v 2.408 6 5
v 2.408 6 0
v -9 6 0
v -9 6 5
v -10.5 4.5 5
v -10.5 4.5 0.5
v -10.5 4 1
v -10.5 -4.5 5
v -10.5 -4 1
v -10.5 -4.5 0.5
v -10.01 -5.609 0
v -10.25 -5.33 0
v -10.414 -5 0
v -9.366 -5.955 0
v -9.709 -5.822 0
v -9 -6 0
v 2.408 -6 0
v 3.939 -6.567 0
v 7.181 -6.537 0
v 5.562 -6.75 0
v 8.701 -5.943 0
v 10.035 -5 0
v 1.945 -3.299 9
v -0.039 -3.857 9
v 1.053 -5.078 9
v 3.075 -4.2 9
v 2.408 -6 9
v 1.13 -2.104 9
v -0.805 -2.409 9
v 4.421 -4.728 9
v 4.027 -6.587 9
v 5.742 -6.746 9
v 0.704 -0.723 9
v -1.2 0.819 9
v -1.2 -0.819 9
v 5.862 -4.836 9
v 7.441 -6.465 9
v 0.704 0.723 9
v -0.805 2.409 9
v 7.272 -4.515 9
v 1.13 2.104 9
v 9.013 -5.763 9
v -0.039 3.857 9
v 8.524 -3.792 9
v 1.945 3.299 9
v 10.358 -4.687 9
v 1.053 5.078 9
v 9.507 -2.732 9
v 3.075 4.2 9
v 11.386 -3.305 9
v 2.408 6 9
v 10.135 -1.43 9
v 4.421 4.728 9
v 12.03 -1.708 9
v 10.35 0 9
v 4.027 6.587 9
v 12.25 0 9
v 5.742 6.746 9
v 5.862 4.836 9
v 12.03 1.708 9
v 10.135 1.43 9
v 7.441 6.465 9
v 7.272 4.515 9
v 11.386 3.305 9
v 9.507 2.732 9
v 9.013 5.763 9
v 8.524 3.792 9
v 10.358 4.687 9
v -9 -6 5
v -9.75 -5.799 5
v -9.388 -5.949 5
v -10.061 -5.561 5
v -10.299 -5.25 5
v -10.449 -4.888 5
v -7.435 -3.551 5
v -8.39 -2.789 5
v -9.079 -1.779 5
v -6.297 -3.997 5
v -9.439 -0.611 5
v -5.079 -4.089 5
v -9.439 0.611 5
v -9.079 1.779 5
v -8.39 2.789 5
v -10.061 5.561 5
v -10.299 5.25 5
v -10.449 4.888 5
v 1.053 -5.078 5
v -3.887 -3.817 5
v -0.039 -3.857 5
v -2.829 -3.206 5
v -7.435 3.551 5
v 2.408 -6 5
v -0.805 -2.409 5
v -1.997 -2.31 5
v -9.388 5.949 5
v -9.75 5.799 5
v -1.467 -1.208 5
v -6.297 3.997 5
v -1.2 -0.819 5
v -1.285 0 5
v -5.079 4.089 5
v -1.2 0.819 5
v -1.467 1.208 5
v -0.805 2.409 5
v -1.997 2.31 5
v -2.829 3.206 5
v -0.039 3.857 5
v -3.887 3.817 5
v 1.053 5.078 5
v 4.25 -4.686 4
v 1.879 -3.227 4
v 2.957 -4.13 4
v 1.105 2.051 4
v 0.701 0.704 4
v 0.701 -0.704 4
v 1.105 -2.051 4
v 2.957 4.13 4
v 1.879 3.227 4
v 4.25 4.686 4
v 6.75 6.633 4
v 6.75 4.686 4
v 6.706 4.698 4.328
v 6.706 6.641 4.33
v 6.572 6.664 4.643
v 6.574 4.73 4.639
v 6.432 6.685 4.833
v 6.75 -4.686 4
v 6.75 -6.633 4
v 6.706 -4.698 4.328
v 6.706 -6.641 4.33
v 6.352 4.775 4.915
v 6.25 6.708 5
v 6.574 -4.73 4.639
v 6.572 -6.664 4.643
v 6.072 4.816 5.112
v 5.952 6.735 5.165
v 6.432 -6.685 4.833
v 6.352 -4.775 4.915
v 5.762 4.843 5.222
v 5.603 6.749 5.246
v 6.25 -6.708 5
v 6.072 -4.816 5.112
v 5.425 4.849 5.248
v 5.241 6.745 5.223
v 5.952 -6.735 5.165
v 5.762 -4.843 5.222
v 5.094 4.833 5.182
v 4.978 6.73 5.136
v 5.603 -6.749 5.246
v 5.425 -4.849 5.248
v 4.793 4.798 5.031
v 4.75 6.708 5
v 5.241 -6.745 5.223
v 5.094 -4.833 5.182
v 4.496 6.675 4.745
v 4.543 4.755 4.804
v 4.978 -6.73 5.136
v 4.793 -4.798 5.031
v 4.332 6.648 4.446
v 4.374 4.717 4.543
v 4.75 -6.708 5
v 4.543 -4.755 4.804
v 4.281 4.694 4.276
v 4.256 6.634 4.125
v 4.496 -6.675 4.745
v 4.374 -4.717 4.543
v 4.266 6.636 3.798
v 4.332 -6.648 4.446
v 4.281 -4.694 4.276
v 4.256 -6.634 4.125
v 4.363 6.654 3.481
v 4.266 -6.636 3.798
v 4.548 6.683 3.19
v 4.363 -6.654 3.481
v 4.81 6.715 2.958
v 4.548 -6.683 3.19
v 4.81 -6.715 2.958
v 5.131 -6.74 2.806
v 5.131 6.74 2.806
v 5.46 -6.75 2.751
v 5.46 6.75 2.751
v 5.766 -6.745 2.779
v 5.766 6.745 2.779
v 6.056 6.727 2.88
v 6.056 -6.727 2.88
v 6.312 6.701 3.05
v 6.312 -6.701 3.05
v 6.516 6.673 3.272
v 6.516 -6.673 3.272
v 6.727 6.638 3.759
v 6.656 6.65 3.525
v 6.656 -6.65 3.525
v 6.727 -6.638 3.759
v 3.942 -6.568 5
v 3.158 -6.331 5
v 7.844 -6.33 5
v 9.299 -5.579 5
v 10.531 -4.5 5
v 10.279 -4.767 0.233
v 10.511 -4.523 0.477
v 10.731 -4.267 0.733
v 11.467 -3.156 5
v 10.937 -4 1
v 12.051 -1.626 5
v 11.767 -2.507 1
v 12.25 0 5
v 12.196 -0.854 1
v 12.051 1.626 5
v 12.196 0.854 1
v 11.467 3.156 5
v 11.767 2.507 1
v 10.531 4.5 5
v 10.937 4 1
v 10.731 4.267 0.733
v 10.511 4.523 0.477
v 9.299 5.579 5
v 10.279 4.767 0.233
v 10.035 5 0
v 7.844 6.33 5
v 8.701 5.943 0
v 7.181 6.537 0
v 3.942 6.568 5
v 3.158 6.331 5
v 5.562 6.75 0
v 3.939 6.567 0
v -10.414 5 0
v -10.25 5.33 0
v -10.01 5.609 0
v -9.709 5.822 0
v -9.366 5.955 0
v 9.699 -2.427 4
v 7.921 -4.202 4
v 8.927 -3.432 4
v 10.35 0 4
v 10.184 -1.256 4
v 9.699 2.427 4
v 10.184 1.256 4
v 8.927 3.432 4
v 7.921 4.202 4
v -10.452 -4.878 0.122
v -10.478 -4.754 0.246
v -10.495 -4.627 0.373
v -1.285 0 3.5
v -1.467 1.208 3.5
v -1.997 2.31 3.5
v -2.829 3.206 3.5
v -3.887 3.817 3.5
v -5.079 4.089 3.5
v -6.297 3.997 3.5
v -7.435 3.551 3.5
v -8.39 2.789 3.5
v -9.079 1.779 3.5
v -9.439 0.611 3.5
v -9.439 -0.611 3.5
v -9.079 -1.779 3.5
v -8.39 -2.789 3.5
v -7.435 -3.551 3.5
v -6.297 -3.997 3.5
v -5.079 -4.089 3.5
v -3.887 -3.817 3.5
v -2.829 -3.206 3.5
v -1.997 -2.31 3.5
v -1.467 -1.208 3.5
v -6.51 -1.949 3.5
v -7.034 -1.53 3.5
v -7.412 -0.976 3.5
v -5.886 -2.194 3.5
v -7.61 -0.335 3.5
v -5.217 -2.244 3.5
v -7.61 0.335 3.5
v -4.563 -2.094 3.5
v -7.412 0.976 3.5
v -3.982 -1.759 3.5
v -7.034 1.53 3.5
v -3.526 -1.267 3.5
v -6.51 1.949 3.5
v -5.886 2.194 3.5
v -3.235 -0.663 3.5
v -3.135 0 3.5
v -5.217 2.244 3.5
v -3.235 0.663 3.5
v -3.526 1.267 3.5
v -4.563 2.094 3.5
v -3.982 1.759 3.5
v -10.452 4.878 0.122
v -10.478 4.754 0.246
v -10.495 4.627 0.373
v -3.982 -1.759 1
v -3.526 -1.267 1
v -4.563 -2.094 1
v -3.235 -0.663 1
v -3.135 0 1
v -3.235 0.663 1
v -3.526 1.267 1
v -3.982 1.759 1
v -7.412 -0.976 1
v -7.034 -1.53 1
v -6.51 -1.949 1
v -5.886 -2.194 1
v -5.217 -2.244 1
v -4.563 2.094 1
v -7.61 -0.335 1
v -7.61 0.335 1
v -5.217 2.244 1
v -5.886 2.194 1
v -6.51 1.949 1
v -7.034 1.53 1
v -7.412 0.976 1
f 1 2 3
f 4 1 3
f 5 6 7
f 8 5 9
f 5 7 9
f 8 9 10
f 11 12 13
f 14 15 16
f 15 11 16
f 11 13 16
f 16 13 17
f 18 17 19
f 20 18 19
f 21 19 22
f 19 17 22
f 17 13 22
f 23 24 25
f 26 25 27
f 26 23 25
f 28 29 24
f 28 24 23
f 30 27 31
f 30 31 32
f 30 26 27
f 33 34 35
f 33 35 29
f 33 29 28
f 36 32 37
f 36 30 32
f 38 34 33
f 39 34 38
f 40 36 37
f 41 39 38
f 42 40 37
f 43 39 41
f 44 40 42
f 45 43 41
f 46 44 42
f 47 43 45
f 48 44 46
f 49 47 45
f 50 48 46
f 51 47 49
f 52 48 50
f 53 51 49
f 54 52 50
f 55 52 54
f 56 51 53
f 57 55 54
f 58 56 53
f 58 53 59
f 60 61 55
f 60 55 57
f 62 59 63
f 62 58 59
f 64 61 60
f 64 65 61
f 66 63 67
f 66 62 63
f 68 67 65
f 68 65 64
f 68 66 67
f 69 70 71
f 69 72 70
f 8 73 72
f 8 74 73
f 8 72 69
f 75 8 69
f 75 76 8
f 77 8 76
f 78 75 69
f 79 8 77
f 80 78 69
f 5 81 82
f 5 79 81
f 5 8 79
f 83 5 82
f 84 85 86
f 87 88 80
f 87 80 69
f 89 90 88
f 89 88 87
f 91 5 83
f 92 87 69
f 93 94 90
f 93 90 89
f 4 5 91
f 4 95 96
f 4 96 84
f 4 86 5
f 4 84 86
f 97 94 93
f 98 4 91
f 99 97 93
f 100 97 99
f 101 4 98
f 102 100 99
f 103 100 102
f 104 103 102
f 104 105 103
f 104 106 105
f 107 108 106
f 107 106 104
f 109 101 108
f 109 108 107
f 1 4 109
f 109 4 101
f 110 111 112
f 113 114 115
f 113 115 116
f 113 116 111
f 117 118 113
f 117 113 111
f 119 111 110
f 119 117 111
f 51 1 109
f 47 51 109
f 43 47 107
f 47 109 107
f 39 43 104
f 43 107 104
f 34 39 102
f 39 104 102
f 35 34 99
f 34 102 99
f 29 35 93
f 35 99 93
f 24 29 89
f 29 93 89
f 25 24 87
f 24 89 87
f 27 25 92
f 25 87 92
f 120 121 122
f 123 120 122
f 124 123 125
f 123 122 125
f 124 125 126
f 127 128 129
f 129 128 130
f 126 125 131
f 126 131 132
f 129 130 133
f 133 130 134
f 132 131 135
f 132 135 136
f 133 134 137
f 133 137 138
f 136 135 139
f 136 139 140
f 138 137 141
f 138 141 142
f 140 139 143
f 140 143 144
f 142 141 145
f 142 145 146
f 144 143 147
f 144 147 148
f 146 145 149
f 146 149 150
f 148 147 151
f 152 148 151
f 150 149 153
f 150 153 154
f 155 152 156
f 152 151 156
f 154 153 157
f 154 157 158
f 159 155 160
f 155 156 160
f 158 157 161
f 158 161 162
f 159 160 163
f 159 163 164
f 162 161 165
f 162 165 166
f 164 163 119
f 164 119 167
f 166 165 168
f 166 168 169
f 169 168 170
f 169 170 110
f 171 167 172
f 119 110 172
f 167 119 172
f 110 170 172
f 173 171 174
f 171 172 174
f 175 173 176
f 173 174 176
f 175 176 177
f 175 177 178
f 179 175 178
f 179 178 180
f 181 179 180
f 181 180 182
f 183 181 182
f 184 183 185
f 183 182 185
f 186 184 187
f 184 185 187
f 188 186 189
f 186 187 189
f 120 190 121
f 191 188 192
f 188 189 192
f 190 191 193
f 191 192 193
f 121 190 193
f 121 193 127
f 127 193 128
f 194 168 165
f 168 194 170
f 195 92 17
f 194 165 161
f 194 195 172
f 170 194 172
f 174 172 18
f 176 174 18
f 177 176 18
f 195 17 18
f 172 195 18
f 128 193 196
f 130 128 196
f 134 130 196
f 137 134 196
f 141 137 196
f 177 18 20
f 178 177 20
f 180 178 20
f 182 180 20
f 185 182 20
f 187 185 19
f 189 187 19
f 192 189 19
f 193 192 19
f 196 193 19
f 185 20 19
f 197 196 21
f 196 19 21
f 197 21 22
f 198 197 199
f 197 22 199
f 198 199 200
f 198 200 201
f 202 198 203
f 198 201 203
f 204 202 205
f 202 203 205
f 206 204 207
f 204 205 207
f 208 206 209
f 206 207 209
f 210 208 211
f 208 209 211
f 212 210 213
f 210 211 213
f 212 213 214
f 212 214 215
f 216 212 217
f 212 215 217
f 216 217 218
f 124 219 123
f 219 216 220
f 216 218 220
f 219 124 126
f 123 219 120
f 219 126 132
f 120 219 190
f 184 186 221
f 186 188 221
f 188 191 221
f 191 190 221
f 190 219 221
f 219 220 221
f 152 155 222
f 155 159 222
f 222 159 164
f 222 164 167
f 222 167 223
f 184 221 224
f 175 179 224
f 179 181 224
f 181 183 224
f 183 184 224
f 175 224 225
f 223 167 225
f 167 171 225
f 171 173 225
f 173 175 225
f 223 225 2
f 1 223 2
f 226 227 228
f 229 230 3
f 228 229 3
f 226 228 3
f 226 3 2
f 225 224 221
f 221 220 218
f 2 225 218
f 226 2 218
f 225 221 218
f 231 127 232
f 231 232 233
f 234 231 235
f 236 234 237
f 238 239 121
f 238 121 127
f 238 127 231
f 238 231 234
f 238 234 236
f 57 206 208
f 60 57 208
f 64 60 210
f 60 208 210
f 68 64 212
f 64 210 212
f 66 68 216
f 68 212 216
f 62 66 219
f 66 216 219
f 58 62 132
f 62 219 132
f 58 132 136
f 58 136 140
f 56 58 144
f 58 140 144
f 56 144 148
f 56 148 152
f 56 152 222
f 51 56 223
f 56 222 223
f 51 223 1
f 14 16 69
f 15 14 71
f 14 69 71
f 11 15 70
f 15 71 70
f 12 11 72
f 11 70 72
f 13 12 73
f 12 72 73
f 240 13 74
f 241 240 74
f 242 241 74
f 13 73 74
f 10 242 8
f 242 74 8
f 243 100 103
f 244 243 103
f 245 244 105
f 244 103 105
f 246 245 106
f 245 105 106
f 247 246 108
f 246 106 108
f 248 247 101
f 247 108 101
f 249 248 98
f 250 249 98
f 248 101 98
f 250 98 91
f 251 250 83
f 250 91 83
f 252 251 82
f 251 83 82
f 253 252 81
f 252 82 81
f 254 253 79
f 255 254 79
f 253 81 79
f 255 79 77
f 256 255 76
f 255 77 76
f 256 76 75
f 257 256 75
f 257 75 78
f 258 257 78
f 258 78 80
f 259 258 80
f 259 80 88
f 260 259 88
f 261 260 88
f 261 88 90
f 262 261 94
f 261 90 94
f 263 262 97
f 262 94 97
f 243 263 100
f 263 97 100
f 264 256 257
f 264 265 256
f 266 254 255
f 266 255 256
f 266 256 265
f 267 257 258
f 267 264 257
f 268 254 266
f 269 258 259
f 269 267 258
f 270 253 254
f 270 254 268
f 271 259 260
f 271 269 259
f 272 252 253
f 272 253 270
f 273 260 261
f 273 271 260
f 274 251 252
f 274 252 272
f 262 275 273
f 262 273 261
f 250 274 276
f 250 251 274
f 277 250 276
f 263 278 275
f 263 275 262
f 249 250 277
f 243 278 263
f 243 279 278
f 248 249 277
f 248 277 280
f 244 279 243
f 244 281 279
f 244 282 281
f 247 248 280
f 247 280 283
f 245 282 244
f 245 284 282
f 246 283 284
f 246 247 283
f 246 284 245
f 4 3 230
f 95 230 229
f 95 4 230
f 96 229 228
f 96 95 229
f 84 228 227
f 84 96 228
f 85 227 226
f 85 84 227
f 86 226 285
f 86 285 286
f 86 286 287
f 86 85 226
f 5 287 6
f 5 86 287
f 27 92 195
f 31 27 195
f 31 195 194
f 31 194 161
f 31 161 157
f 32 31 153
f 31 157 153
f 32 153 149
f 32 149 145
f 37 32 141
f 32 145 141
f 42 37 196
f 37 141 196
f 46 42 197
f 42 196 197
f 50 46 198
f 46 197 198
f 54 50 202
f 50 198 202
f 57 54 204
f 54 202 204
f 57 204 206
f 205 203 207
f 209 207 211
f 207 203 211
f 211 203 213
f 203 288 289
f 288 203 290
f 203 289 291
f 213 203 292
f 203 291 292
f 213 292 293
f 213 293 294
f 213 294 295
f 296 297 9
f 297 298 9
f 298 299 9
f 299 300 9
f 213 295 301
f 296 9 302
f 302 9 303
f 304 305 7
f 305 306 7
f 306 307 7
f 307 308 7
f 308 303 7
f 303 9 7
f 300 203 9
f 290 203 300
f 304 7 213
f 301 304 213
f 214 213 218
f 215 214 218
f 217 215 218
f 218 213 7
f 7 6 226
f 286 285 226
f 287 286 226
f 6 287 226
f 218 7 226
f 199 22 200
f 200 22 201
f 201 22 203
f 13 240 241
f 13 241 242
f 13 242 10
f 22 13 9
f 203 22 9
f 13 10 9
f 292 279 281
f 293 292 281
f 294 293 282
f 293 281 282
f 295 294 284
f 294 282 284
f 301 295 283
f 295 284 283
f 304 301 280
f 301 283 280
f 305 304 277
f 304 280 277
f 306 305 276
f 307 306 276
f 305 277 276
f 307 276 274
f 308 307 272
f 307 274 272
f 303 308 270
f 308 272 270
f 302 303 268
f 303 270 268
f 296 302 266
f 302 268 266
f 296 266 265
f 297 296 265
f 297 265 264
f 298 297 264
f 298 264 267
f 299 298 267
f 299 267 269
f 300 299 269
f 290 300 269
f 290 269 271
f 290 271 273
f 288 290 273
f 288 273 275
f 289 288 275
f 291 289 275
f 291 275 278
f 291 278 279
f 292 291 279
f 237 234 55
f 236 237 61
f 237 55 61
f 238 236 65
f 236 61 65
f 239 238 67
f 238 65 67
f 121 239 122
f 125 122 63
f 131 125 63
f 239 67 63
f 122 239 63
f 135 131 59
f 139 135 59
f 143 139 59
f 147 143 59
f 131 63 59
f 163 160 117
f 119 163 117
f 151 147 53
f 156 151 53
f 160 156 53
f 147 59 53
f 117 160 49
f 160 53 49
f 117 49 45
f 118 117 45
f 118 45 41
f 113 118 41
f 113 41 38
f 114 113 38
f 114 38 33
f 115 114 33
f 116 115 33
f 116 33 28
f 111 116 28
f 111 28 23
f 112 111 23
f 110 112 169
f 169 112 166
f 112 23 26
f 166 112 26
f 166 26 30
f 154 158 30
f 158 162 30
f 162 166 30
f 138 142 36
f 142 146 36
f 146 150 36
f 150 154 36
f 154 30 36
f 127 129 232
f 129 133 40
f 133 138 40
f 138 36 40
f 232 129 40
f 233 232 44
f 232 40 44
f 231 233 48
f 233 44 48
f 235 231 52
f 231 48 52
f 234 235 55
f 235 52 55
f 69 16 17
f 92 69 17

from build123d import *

# Parameters (mm, degrees)
F1_DEPTH  = 5
F3_DEPTH  = 22.751
F4_R      = 2.25
F5_DEPTH  = 25
F6_R      = 4.1
F6_R_2    = 2.25
F7_DEPTH  = 1.5
F9_DEPTH  = 4
F10_R     = 1.5
F11_R     = 4.85
F12_DEPTH = 5
F13_R     = 1.25
F14_DEPTH = 12.5


# Not quite as in the source:
# - a feature names something its author has since deleted; it is built from what else it names


with BuildPart() as f1:
    # F0 (on Top) → F1 (new body)
    with BuildSketch(Plane.XY):
        with BuildLine():
            Line((-10.5, -6), (2.4076707808, -6))
            ThreePointArc((2.4076707808, -6), (12.25, 0), (2.4076707808, 6))
            Line((2.4076707808, 6), (-10.5, 6))
            Line((-10.5, 6), (-10.5, -6))
        make_face()
    extrude(amount=F1_DEPTH)

    # F2 (on face) → F3 (cut, through all)
    with BuildSketch(Plane(origin=(-10.5, 0, 0), x_dir=(0, -1, 0), z_dir=(-1, 0, 0))):
        Polygon((5, 0), (4, 1), (-4, 1), (-5, 0), align=None)
    extrude(amount=-F3_DEPTH, mode=Mode.SUBTRACT)

    # F4 (on face) → F5 (cut)
    with BuildSketch(Plane.XY.offset(5)):
        with Locations((-5.3849667311, 0)):
            Circle(F4_R)
    extrude(amount=-F5_DEPTH, mode=Mode.SUBTRACT)

    # F6 (on face) → F7 (cut)
    with BuildSketch(Plane.XY.offset(5)):
        with Locations((-5.3849667311, 0)):
            Circle(F6_R)
        with Locations((-5.3849667311, 0)):
            Circle(F6_R_2, mode=Mode.SUBTRACT)
    extrude(amount=-F7_DEPTH, mode=Mode.SUBTRACT)

    # F8 (on face) → F9 (join)
    with BuildSketch(Plane.XY.offset(5)):
        with BuildLine():
            ThreePointArc((2.4076707808, -6), (9.0134938288, -5.7634938288), (12.25, 0))
            ThreePointArc((12.25, 0), (9.0134938288, 5.7634938288), (2.4076707808, 6))
            ThreePointArc((2.4076707808, 6), (-1.25, 0), (2.4076707808, -6))
        make_face()
    extrude(amount=F9_DEPTH)

    # F10
    f10_edges = [f1.edges().sort_by_distance(p)[0] for p in [
        (-10.5, -6, 2.5),
        (-10.5, 6, 2.5),
    ]]
    fillet(f10_edges, radius=F10_R)

    # F11 (on face) → F12 (cut)
    with BuildSketch(Plane.XY.offset(9)):
        with Locations((5.5, 0)):
            Circle(F11_R)
    extrude(amount=-F12_DEPTH, mode=Mode.SUBTRACT)

    # F13 (on Front) → F14 (cut, symmetric)
    with BuildSketch(Plane.XZ):
        with Locations((5.5, 4)):
            Circle(F13_R)
    extrude(amount=F14_DEPTH, both=True, mode=Mode.SUBTRACT)


solid = f1.part
